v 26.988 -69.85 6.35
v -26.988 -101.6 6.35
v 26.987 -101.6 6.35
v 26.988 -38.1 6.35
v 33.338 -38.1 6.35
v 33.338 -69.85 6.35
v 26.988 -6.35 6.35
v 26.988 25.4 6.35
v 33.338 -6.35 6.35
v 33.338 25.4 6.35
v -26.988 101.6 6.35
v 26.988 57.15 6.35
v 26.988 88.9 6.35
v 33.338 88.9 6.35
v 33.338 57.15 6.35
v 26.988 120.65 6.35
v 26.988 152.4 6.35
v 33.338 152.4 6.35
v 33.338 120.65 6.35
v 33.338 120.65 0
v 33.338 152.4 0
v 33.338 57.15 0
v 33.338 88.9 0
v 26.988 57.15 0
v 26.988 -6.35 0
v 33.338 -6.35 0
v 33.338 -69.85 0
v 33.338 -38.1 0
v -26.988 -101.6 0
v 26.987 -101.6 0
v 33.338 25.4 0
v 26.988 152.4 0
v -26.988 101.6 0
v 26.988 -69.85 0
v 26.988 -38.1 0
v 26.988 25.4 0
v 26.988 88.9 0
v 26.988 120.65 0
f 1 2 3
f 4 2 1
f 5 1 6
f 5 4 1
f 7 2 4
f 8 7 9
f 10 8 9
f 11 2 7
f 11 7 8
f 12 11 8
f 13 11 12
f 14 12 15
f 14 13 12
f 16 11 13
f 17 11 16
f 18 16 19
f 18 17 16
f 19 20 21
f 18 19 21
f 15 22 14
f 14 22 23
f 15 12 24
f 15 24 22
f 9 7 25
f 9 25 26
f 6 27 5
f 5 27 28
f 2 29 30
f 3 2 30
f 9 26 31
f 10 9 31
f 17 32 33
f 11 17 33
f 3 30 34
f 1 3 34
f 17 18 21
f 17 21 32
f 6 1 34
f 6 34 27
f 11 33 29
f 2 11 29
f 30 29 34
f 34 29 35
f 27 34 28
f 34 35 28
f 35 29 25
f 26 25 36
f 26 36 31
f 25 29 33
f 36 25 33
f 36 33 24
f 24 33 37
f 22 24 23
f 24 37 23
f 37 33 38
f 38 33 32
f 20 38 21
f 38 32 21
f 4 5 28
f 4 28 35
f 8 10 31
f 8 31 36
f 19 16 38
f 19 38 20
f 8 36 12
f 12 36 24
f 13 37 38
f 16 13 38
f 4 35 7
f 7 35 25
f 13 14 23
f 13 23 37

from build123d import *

# Parameters (mm, degrees)
BOSS_EXTRUDE1_DEPTH = 6.35
SKETCH2_W           = 12.7
SKETCH2_H           = 6.35
CUT_EXTRUDE1_DEPTH  = 6.35


with BuildPart() as part:
    # Sketch1 → Boss-Extrude1 (new body)
    with BuildSketch(Plane.XY):
        Polygon((-26.9875, -101.6), (14.2875, -101.6), (14.2875, -107.95), (26.9875, -107.95), (26.9875, -69.85), (33.3375, -69.85), (33.3375, -38.1), (26.9875, -38.1), (26.9875, -6.35), (33.3375, -6.35), (33.3375, 25.4), (26.9875, 25.4), (26.9875, 57.15), (33.3375, 57.15), (33.3375, 88.9), (26.9875, 88.9), (26.9875, 120.65), (33.3375, 120.65), (33.3375, 152.4), (26.9875, 152.4), (-26.9875, 101.6), align=None)
    extrude(amount=BOSS_EXTRUDE1_DEPTH)

    # Sketch2 → Cut-Extrude1 (cut)
    with BuildSketch(Plane(origin=(0, 0, 0), x_dir=(-1, 0, 0), z_dir=(0, 0, -1))):
        with Locations((-20.6375, -104.775)):
            Rectangle(SKETCH2_W, SKETCH2_H)
    extrude(amount=-CUT_EXTRUDE1_DEPTH, mode=Mode.SUBTRACT)


solid = part.part
